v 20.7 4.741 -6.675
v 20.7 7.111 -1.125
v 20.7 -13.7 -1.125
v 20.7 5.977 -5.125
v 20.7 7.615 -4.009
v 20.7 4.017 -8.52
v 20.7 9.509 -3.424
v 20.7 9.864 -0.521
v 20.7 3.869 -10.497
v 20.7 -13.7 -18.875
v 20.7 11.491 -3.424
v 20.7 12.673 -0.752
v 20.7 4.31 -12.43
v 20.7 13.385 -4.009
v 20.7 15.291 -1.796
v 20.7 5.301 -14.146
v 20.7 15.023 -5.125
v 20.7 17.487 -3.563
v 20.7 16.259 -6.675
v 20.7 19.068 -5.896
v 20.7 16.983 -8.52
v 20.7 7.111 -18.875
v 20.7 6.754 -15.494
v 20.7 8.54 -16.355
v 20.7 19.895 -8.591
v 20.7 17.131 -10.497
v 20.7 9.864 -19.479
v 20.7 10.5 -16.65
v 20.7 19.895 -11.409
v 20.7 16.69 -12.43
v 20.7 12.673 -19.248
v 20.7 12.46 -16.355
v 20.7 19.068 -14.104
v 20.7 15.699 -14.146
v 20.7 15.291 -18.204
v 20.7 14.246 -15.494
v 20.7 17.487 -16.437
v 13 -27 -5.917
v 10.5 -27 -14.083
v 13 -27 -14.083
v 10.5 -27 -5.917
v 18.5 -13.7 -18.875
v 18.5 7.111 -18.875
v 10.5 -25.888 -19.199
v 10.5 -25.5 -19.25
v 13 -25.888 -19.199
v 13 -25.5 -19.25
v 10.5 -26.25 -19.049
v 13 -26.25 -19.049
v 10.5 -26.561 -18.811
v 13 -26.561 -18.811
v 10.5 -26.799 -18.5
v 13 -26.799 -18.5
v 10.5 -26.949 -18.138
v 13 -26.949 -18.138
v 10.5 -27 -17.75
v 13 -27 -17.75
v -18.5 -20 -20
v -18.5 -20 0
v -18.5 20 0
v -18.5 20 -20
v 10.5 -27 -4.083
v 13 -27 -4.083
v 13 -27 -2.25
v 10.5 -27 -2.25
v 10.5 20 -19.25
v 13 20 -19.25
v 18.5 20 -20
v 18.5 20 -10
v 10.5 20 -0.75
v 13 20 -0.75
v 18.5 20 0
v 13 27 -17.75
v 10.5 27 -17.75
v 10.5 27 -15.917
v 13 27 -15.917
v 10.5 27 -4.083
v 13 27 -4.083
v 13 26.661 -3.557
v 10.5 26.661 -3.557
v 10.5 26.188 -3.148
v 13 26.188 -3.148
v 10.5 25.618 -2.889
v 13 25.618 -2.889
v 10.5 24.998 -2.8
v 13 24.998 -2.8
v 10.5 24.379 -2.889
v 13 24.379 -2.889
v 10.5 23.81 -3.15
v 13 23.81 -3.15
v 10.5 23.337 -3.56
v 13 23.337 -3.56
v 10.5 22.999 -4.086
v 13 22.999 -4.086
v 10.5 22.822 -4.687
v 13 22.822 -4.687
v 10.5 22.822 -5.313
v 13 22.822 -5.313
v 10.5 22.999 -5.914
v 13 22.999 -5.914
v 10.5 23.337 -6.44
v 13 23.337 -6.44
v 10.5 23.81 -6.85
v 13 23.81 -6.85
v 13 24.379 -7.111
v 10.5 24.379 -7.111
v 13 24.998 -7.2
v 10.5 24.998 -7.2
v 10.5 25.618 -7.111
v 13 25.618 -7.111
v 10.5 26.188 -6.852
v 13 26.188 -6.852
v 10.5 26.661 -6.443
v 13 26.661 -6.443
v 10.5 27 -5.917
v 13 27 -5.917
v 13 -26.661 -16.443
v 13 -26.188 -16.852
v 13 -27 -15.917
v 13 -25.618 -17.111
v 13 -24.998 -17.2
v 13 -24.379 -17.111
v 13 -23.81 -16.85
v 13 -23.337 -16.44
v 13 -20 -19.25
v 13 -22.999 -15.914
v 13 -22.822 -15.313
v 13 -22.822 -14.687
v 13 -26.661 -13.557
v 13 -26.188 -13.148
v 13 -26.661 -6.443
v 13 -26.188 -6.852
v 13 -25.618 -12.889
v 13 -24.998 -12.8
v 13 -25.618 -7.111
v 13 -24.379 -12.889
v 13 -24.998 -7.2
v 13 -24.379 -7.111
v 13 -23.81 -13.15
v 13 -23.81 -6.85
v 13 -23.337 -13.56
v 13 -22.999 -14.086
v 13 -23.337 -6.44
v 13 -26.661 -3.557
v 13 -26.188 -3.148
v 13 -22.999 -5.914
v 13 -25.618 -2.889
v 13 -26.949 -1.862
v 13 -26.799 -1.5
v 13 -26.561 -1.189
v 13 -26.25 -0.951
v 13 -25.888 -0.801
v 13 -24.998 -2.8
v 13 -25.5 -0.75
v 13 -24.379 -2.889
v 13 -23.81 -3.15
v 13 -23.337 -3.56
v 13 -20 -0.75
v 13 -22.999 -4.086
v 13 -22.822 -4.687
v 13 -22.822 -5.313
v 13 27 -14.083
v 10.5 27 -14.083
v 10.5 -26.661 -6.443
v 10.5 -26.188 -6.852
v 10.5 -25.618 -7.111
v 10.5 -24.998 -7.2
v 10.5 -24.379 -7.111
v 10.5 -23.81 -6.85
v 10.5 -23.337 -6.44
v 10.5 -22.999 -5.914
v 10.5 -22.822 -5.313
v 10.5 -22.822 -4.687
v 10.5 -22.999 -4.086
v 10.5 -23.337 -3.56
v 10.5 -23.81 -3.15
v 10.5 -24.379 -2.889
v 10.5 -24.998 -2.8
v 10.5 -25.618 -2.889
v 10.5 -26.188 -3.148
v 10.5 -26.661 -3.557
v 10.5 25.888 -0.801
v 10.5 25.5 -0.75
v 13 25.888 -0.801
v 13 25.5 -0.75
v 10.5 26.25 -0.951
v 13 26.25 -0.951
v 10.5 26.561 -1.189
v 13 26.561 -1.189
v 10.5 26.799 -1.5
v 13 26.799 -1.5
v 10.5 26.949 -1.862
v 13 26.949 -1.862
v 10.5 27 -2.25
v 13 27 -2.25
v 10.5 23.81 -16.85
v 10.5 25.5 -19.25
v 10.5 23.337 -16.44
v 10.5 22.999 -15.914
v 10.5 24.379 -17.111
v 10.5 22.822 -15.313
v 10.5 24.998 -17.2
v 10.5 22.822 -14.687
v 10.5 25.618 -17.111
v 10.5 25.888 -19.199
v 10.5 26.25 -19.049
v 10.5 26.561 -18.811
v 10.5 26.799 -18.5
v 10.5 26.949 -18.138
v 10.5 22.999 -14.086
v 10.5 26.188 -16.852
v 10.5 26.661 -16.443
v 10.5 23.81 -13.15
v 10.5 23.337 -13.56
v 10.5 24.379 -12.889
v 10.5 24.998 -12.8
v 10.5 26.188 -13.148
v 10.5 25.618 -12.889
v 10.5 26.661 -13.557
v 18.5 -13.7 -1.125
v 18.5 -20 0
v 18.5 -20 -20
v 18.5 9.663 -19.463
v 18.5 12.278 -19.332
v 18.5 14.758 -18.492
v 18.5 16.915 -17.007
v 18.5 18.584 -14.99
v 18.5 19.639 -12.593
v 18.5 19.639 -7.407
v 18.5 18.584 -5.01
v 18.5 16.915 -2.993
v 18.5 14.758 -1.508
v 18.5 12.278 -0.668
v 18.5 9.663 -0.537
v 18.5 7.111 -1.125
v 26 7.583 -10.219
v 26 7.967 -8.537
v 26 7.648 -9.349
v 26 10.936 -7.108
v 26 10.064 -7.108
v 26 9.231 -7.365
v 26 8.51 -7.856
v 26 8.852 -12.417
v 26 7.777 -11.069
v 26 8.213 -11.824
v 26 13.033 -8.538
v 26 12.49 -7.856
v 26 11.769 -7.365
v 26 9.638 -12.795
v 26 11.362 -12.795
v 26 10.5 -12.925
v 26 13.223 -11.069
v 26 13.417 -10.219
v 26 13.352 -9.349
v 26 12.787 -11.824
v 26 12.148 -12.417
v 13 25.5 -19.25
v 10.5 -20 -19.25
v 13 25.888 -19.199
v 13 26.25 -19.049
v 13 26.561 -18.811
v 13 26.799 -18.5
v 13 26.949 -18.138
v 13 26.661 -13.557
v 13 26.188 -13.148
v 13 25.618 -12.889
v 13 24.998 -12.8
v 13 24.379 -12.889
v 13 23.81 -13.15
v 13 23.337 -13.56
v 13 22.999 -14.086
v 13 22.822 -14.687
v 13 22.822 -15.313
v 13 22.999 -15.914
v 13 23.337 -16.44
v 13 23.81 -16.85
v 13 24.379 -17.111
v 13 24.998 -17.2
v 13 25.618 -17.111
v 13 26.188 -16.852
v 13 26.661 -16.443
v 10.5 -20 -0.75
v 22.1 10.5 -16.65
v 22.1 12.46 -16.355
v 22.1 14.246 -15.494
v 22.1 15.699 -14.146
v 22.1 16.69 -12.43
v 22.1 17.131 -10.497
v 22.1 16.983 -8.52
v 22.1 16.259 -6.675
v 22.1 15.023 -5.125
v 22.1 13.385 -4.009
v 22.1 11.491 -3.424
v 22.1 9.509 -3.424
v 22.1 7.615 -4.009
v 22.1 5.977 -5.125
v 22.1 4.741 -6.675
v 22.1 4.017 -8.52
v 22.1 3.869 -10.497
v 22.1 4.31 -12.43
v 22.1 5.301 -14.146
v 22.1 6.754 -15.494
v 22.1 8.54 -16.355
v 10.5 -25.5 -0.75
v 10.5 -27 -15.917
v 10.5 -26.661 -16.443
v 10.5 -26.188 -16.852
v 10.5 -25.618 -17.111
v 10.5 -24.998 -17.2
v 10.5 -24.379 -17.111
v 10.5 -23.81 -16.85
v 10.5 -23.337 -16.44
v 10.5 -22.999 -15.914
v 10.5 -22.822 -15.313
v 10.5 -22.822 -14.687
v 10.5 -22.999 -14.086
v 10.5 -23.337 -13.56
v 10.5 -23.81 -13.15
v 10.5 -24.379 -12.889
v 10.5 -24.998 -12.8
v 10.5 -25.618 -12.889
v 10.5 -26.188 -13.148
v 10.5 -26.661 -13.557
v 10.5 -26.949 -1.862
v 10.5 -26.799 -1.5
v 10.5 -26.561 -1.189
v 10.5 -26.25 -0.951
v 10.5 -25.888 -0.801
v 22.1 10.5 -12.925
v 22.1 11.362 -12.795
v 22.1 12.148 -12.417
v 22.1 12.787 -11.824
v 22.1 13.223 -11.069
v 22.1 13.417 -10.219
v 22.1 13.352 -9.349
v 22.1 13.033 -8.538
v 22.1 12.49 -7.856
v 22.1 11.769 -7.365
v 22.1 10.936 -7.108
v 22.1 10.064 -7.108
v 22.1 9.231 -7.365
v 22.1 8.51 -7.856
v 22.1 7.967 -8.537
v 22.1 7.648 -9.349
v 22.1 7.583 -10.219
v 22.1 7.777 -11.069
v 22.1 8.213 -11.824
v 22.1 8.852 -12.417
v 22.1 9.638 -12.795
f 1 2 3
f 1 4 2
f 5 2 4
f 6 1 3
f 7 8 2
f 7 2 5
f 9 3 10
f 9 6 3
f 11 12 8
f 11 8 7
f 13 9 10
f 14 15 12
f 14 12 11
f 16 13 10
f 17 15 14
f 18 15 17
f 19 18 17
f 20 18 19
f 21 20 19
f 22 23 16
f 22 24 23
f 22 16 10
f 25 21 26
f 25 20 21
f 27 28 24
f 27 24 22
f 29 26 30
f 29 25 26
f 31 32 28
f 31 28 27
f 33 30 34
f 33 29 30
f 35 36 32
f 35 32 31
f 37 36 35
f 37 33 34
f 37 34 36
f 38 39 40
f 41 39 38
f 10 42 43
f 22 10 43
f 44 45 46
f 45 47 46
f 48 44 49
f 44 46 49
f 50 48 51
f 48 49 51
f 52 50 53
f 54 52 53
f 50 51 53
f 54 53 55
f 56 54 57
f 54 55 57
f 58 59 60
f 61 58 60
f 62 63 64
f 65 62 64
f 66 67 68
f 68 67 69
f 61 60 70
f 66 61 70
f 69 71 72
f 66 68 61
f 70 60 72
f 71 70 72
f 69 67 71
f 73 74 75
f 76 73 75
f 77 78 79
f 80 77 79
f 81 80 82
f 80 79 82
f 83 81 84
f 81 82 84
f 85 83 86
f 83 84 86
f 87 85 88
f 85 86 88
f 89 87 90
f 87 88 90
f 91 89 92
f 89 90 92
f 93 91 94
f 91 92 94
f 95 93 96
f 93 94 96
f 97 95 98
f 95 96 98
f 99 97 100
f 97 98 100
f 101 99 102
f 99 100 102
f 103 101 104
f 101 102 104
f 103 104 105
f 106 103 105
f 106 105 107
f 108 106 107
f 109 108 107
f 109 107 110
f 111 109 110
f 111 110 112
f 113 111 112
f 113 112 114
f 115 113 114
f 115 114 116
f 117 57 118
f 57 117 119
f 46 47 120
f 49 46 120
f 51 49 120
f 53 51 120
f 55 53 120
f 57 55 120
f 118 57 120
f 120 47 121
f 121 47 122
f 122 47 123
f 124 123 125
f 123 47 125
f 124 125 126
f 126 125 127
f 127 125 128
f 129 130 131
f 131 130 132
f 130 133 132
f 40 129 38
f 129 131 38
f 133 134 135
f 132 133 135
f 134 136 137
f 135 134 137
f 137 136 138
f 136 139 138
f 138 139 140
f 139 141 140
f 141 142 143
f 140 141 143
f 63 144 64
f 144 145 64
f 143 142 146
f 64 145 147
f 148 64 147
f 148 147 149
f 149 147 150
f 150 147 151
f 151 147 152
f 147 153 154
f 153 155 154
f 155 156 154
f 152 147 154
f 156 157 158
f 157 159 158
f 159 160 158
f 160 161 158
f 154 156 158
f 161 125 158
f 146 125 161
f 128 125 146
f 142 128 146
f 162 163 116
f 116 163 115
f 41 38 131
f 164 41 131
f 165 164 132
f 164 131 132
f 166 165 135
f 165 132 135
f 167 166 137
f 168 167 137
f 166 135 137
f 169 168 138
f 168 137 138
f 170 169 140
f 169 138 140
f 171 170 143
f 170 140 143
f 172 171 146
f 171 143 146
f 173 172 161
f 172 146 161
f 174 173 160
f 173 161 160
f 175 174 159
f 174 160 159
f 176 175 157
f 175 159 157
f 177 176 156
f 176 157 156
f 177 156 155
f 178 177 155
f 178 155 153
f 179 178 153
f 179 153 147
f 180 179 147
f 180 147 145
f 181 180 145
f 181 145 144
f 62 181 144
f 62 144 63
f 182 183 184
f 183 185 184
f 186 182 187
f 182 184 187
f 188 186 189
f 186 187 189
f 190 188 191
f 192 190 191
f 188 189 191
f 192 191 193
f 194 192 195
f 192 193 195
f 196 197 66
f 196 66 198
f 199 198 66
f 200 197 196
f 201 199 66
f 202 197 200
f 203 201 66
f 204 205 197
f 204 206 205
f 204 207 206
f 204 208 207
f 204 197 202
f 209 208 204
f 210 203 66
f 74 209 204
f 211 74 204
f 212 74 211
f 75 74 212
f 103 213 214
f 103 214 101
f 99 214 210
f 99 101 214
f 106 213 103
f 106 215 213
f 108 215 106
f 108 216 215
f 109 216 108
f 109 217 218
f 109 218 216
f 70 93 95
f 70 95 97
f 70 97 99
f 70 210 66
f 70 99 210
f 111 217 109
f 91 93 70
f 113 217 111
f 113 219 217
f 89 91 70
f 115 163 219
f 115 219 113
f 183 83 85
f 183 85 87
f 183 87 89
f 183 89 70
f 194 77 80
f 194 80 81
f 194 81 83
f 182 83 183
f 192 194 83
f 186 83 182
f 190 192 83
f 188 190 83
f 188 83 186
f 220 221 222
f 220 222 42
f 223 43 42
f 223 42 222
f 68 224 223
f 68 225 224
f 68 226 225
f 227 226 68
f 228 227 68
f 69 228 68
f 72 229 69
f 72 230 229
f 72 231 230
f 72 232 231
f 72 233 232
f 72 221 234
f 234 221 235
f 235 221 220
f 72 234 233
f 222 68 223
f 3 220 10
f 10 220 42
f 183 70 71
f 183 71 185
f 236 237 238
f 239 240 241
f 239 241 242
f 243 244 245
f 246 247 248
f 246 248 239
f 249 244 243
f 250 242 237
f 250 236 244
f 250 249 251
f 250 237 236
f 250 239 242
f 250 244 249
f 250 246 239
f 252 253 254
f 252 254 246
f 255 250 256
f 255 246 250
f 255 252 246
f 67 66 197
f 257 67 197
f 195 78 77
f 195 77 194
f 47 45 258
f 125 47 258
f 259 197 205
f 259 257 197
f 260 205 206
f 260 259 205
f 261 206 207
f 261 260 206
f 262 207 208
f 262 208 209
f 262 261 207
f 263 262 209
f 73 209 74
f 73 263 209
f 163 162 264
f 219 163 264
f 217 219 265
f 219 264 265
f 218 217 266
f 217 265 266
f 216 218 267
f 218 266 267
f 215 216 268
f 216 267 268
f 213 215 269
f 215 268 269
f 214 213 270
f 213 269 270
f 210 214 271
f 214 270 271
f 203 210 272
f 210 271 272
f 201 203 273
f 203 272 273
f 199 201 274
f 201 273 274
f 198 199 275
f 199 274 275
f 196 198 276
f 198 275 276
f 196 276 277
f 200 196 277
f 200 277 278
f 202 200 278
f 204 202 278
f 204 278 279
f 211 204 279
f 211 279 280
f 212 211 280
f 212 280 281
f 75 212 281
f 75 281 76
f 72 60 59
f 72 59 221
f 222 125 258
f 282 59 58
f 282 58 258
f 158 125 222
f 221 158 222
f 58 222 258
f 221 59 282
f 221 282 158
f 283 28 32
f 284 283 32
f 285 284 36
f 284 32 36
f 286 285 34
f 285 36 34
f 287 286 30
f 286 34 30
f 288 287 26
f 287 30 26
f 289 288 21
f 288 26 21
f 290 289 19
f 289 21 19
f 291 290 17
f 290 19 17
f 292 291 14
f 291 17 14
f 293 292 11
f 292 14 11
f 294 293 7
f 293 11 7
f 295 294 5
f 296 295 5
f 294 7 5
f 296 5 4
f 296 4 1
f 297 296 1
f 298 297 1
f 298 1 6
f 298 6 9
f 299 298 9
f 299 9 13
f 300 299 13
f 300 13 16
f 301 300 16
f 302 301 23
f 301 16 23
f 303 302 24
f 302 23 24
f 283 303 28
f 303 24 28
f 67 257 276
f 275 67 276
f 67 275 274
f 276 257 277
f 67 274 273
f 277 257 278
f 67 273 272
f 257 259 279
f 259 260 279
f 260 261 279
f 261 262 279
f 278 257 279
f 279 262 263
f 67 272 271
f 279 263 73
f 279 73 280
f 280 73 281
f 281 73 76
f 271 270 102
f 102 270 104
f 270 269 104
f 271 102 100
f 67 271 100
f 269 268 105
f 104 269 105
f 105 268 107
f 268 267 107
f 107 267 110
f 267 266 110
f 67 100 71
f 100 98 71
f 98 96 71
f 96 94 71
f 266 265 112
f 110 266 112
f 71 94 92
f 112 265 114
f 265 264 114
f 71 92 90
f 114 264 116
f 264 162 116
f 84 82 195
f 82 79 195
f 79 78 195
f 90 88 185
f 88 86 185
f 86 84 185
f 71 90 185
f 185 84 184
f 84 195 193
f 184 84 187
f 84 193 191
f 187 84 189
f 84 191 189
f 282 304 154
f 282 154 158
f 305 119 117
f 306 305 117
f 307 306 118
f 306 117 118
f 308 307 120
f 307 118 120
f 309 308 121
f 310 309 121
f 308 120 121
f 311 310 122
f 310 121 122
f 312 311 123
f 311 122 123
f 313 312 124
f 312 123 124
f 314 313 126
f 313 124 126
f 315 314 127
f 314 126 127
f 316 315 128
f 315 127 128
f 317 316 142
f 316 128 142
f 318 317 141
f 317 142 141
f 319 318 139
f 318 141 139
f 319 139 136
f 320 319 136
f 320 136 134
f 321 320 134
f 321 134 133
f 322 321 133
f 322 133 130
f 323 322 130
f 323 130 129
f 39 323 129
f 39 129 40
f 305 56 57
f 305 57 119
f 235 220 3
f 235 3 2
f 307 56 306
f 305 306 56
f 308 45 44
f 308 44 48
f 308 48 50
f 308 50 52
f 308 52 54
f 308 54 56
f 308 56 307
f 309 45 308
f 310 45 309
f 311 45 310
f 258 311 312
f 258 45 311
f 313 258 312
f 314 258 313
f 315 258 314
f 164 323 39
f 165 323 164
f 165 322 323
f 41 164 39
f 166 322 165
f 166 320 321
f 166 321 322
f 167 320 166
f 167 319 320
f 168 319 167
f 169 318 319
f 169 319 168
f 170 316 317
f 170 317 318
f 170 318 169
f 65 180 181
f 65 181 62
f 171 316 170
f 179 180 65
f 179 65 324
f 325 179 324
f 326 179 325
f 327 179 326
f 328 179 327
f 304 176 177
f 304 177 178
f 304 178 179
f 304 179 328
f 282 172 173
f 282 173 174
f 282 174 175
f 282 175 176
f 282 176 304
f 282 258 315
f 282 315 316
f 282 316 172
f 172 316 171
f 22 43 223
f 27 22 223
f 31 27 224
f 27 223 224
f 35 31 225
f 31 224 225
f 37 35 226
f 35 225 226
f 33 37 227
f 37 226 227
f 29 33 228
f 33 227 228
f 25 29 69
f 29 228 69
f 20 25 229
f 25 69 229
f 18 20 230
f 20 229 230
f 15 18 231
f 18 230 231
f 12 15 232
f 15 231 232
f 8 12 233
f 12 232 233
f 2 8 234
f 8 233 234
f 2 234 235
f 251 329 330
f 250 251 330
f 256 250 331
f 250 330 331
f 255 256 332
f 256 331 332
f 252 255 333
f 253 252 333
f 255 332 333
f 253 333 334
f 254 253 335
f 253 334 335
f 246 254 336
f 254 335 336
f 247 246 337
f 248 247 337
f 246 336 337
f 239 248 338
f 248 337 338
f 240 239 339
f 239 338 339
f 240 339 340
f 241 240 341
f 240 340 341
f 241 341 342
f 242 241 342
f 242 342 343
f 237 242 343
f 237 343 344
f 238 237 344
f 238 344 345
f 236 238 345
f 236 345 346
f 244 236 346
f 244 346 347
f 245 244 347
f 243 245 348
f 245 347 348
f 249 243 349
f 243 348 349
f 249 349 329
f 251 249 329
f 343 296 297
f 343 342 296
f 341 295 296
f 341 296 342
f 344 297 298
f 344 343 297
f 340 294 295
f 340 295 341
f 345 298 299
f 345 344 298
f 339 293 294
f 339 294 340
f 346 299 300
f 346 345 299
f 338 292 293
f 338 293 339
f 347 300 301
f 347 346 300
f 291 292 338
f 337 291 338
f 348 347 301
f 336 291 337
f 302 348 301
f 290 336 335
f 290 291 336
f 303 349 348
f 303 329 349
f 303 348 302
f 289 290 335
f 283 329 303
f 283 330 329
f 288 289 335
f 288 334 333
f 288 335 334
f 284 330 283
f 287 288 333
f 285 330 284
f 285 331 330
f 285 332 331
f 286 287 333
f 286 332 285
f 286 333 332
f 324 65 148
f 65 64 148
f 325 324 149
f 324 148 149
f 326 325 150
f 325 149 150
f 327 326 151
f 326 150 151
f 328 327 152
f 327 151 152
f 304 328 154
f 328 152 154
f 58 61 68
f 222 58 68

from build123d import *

# Parameters (mm, degrees)
SKETCH1_W           = 37
SKETCH1_H           = 40
BOSS_EXTRUDE1_DEPTH = 20
SKETCH2_W           = 18.5
SKETCH2_H           = 54
BOSS_EXTRUDE2_DEPTH = 2.5
FILLET1_R           = 1.5
CUT_EXTRUDE1_REACH  = 48.057
SKETCH3_R           = 2.2
SKETCH4_R           = 9.5
BOSS_EXTRUDE3_DEPTH = 2.2
SKETCH5_W           = 17.75
SKETCH5_H           = 23.804167323
BOSS_EXTRUDE4_DEPTH = 2.2
SKETCH6_R           = 6.65
BOSS_EXTRUDE5_DEPTH = 1.4
SKETCH7_R           = 2.925
BOSS_EXTRUDE6_DEPTH = 3.9


with BuildPart() as part:
    # Sketch1 → Boss-Extrude1 (new body)
    with BuildSketch(Plane.XY):
        Rectangle(SKETCH1_W, SKETCH1_H)
    extrude(amount=-BOSS_EXTRUDE1_DEPTH)

    # Sketch2 → Boss-Extrude2 (add)
    with BuildSketch(Plane.ZY.offset(-10.5)):
        with Locations((-10, 0)):
            Rectangle(SKETCH2_W, SKETCH2_H)
    extrude(amount=-BOSS_EXTRUDE2_DEPTH)

    # Fillet1
    fillet1_edges = [part.edges().sort_by_distance(p)[0] for p in [
        (11.75, -27, -19.25),
        (11.75, 27, -0.75),
        (11.75, -27, -0.75),
        (11.75, 27, -19.25),
    ]]
    fillet(fillet1_edges, radius=FILLET1_R)

    # Sketch3 → Cut-Extrude1 (cut, up to next)
    with BuildSketch(Plane(origin=(13, 0, 0), x_dir=(0, 0, -1), z_dir=(1, 0, 0)), mode=Mode.PRIVATE) as cut_extrude1_sk1:
        with Locations((5, 25)):
            Circle(SKETCH3_R)
    cut_extrude1_tool1 = extrude(cut_extrude1_sk1.sketch, amount=-CUT_EXTRUDE1_REACH, mode=Mode.PRIVATE) & part.part
    # Sketch3 → Cut-Extrude1 (cut, up to next)
    with BuildSketch(Plane(origin=(13, 0, 0), x_dir=(0, 0, -1), z_dir=(1, 0, 0)), mode=Mode.PRIVATE) as cut_extrude1_sk2:
        with Locations((15, 25)):
            Circle(SKETCH3_R)
    cut_extrude1_tool2 = extrude(cut_extrude1_sk2.sketch, amount=-CUT_EXTRUDE1_REACH, mode=Mode.PRIVATE) & part.part
    # Sketch3 → Cut-Extrude1 (cut, up to next)
    with BuildSketch(Plane(origin=(13, 0, 0), x_dir=(0, 0, -1), z_dir=(1, 0, 0)), mode=Mode.PRIVATE) as cut_extrude1_sk3:
        with Locations((5, -25)):
            Circle(SKETCH3_R)
    cut_extrude1_tool3 = extrude(cut_extrude1_sk3.sketch, amount=-CUT_EXTRUDE1_REACH, mode=Mode.PRIVATE) & part.part
    # Sketch3 → Cut-Extrude1 (cut, up to next)
    with BuildSketch(Plane(origin=(13, 0, 0), x_dir=(0, 0, -1), z_dir=(1, 0, 0)), mode=Mode.PRIVATE) as cut_extrude1_sk4:
        with Locations((15, -25)):
            Circle(SKETCH3_R)
    cut_extrude1_tool4 = extrude(cut_extrude1_sk4.sketch, amount=-CUT_EXTRUDE1_REACH, mode=Mode.PRIVATE) & part.part
    add(cut_extrude1_tool1.solids().sort_by_distance((13, 25, -5))[0], mode=Mode.SUBTRACT)
    add(cut_extrude1_tool2.solids().sort_by_distance((13, 25, -15))[0], mode=Mode.SUBTRACT)
    add(cut_extrude1_tool3.solids().sort_by_distance((13, -25, -5))[0], mode=Mode.SUBTRACT)
    add(cut_extrude1_tool4.solids().sort_by_distance((13, -25, -15))[0], mode=Mode.SUBTRACT)

    # Sketch4 → Boss-Extrude3 (add)
    with BuildSketch(Plane(origin=(18.5, 0, 0), x_dir=(0, 0, -1), z_dir=(1, 0, 0))):
        with Locations(Location((10, 10.5, 0), (0, 0, 90))):
            Circle(SKETCH4_R)
    extrude(amount=BOSS_EXTRUDE3_DEPTH)

    # Sketch5 → Boss-Extrude4 (add)
    with BuildSketch(Plane(origin=(18.5, 0, 0), x_dir=(0, 0, -1), z_dir=(1, 0, 0))):
        with Locations((10, -1.797916339)):
            Rectangle(SKETCH5_W, SKETCH5_H)
    extrude(amount=BOSS_EXTRUDE4_DEPTH)

    # Sketch6 → Boss-Extrude5 (add)
    with BuildSketch(Plane(origin=(20.7, 0, 0), x_dir=(0, 0, -1), z_dir=(1, 0, 0))):
        with Locations((10, 10.5)):
            Circle(SKETCH6_R)
    extrude(amount=BOSS_EXTRUDE5_DEPTH)

    # Sketch7 → Boss-Extrude6 (add)
    with BuildSketch(Plane(origin=(22.1, 0, 0), x_dir=(0, 0, -1), z_dir=(1, 0, 0))):
        with Locations((10, 10.5)):
            Circle(SKETCH7_R)
    extrude(amount=BOSS_EXTRUDE6_DEPTH)


solid = part.part
